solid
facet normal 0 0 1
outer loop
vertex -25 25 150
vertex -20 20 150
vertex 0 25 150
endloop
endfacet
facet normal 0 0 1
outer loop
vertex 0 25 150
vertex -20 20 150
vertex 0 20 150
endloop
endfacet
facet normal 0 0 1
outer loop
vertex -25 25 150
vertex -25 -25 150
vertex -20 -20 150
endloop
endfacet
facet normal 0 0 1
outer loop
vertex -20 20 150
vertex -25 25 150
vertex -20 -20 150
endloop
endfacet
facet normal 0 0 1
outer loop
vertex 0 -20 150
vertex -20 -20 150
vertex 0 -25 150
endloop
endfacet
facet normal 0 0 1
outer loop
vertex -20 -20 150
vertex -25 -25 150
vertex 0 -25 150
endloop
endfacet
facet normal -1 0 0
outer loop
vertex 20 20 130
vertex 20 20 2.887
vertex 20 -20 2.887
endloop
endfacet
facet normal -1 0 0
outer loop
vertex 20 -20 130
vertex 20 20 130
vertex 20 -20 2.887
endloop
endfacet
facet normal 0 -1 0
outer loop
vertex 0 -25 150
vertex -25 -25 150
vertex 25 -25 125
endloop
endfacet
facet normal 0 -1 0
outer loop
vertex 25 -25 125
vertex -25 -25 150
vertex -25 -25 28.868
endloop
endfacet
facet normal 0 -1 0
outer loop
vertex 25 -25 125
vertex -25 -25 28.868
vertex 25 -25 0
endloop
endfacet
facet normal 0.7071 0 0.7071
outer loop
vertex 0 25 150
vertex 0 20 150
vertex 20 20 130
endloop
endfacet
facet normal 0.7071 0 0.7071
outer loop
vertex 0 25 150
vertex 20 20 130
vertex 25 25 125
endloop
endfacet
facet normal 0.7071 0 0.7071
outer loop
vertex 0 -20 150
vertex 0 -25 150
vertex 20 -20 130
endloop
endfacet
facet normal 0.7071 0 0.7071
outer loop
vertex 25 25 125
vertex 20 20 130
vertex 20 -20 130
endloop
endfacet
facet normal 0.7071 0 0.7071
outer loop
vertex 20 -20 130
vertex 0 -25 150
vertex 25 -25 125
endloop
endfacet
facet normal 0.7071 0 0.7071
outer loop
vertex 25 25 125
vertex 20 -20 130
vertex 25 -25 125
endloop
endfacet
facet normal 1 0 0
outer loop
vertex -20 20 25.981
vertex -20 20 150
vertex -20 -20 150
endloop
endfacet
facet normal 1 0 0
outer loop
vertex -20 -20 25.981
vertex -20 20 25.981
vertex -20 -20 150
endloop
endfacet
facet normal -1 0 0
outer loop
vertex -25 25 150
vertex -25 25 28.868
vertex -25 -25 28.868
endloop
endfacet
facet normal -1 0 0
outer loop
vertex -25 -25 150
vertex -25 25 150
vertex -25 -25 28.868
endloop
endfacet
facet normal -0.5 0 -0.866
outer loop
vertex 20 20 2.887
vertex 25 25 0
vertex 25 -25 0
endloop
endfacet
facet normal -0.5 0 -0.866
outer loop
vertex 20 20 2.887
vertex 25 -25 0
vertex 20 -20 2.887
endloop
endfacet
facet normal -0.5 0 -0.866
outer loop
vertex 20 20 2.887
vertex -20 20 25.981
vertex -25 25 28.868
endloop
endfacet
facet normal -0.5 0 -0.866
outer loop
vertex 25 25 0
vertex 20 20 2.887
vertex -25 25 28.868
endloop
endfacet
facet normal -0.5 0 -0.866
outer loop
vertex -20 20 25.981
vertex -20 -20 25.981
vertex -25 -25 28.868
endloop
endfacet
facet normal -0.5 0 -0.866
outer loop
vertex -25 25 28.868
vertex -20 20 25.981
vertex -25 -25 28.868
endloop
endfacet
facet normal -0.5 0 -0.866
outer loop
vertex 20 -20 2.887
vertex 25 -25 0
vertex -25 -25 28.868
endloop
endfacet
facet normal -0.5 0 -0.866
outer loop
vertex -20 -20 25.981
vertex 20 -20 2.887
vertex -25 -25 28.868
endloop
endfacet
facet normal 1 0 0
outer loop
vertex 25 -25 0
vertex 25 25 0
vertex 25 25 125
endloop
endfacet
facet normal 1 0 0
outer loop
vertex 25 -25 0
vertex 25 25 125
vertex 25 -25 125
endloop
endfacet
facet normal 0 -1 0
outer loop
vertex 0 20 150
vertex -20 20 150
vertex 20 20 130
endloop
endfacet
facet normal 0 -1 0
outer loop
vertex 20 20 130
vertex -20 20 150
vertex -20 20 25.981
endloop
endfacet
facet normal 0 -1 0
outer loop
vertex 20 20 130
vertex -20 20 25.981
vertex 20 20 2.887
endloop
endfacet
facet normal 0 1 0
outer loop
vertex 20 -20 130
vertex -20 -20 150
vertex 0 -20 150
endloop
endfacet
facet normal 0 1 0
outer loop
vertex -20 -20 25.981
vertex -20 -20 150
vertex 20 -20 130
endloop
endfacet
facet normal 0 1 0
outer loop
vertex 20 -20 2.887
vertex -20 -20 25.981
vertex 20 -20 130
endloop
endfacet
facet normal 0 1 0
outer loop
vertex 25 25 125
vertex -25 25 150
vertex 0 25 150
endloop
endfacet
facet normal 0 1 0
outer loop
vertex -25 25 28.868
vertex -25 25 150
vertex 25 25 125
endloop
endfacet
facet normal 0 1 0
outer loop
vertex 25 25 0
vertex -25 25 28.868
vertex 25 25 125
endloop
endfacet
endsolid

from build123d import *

# Parameters (mm, degrees)
SKETCH2_W           = 50
SKETCH2_H           = 50
SKETCH2_W_2         = 40
SKETCH2_H_2         = 40
BOSS_EXTRUDE1_DEPTH = 150
CUT_EXTRUDE1_DEPTH  = 161.078105936
CUT_EXTRUDE2_DEPTH  = 161.078105936


with BuildPart() as part:
    # Sketch2 → Boss-Extrude1 (new body)
    with BuildSketch(Plane(origin=(0, 0, 0), x_dir=(1, 0, 0), z_dir=(0, 0, -1))):
        Rectangle(SKETCH2_W, SKETCH2_H)
        Rectangle(SKETCH2_W_2, SKETCH2_H_2, mode=Mode.SUBTRACT)
    extrude(amount=-BOSS_EXTRUDE1_DEPTH)

    # Sketch3 → Cut-Extrude1 (cut, through all)
    with BuildSketch(Plane.XZ.offset(25)):
        Polygon((0, 150), (25, 125), (25, 150), align=None)
    extrude(amount=-CUT_EXTRUDE1_DEPTH, mode=Mode.SUBTRACT)

    # Sketch4 → Cut-Extrude2 (cut, through all)
    with BuildSketch(Plane.XZ.offset(25)):
        Polygon((25, 0), (-25, 28.867513459), (-25, 0), align=None)
    extrude(amount=-CUT_EXTRUDE2_DEPTH, mode=Mode.SUBTRACT)


solid = part.part
